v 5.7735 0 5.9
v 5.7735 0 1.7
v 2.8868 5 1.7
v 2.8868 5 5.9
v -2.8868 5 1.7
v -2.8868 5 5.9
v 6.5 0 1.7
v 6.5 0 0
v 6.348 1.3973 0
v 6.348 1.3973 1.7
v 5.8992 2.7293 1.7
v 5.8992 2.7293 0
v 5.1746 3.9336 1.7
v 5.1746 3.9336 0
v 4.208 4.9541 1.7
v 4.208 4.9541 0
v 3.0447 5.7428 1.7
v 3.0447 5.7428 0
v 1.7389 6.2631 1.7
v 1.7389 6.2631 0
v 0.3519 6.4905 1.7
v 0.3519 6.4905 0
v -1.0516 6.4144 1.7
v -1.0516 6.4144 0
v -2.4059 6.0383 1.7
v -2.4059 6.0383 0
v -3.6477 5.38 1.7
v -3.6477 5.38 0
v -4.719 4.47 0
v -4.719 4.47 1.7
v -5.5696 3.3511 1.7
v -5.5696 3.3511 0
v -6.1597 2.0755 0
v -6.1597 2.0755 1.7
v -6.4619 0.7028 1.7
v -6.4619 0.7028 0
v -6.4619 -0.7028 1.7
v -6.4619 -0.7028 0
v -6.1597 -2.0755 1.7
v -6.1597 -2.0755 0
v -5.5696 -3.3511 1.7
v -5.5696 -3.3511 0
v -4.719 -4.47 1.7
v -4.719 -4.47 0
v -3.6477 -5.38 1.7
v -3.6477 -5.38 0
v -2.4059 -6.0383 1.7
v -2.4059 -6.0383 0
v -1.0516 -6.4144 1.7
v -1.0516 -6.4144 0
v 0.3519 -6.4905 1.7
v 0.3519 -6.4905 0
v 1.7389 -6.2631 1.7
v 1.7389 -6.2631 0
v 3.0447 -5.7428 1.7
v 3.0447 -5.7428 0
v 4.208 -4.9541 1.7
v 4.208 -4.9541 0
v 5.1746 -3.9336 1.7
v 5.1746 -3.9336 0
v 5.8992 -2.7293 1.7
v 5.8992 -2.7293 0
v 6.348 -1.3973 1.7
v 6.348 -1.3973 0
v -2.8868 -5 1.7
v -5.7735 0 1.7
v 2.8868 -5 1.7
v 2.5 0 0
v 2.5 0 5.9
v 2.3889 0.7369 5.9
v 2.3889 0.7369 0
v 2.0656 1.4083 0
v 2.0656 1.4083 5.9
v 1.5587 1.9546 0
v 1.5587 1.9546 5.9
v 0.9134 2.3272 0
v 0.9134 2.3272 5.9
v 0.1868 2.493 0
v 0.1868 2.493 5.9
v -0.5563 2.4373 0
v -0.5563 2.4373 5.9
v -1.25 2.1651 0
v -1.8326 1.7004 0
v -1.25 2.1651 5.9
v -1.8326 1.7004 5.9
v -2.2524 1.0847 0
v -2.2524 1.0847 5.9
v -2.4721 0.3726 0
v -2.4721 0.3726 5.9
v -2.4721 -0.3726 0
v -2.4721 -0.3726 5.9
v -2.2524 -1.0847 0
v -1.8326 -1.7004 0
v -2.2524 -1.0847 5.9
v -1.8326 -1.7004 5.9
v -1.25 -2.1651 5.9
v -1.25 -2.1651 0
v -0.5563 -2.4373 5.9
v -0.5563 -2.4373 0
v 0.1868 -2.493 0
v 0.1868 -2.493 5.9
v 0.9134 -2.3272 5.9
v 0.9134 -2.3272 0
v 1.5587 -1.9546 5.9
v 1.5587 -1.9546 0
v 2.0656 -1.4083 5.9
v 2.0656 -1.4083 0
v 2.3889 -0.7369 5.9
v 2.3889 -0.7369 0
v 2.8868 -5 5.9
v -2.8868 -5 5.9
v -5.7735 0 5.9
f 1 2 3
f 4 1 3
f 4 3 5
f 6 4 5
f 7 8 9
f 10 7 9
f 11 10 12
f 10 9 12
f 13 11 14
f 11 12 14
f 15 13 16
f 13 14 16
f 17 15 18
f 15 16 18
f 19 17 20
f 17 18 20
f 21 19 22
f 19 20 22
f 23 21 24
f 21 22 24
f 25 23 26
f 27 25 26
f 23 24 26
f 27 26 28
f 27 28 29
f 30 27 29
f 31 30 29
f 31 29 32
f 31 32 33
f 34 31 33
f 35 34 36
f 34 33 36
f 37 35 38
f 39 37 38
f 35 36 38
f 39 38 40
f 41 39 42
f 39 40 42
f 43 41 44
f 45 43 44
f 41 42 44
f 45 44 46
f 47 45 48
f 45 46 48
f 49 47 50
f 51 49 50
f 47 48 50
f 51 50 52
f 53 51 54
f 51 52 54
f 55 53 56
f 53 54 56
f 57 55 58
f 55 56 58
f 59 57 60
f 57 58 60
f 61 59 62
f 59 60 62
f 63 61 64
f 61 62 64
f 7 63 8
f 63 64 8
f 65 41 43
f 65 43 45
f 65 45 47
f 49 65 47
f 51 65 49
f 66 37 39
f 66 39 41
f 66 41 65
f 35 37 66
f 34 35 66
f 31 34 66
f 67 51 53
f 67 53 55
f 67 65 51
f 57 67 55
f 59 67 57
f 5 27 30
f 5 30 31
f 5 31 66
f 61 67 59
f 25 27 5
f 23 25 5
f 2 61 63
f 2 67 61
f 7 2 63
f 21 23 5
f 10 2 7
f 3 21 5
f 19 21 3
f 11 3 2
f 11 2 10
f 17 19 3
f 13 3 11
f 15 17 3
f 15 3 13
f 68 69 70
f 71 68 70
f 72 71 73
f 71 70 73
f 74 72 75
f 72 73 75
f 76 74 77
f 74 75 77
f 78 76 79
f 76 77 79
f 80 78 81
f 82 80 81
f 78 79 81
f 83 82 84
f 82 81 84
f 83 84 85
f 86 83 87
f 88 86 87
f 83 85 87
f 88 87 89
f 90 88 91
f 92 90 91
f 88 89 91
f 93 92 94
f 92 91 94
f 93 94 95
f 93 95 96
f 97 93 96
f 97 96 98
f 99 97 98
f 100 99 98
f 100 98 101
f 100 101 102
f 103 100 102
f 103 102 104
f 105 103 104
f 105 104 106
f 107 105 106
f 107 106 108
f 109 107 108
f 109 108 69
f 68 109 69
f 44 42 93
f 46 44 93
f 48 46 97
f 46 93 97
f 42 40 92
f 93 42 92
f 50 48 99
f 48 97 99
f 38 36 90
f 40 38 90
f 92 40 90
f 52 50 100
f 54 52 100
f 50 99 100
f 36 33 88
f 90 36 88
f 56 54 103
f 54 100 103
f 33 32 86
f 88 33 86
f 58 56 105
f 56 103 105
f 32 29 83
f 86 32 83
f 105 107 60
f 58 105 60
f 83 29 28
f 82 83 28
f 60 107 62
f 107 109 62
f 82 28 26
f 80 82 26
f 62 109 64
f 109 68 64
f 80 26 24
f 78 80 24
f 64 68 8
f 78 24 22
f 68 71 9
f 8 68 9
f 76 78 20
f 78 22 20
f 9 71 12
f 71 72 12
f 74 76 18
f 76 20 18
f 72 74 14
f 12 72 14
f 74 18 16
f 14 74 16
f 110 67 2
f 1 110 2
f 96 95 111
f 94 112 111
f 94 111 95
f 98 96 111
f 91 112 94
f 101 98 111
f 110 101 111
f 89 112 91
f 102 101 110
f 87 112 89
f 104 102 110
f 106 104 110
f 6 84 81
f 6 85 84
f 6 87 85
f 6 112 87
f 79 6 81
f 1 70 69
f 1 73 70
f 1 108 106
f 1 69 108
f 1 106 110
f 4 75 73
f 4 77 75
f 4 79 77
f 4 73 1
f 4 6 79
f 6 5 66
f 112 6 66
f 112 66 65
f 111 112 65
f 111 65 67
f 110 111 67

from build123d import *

# Parameters (mm, degrees)
SKETCH_1_R          = 6.5
EXTRUDE_1_DEPTH     = 1.7
EXTRUDE_2_DEPTH     = 4.2
SKETCH_3_R          = 2.5
CUT_EXTRUDE_1_DEPTH = 11.9229117


with BuildPart() as part:
    # Эскиз1 → Бобышка-Вытянуть1 (new body)
    with BuildSketch(Plane.XY):
        Circle(SKETCH_1_R)
    extrude(amount=EXTRUDE_1_DEPTH)

    # Эскиз2 → Бобышка-Вытянуть2 (add)
    with BuildSketch(Plane.XY.offset(1.7)):
        Polygon((5.773502692, 0), (2.886751346, 5), (-2.886751346, 5), (-5.773502692, 0), (-2.886751346, -5), (2.886751346, -5), align=None)
    extrude(amount=EXTRUDE_2_DEPTH)

    # Эскиз3 → Вырез-Вытянуть1 (cut, through all)
    with BuildSketch(Plane.XY.offset(5.9)):
        Circle(SKETCH_3_R)
    extrude(amount=-CUT_EXTRUDE_1_DEPTH, mode=Mode.SUBTRACT)


solid = part.part
